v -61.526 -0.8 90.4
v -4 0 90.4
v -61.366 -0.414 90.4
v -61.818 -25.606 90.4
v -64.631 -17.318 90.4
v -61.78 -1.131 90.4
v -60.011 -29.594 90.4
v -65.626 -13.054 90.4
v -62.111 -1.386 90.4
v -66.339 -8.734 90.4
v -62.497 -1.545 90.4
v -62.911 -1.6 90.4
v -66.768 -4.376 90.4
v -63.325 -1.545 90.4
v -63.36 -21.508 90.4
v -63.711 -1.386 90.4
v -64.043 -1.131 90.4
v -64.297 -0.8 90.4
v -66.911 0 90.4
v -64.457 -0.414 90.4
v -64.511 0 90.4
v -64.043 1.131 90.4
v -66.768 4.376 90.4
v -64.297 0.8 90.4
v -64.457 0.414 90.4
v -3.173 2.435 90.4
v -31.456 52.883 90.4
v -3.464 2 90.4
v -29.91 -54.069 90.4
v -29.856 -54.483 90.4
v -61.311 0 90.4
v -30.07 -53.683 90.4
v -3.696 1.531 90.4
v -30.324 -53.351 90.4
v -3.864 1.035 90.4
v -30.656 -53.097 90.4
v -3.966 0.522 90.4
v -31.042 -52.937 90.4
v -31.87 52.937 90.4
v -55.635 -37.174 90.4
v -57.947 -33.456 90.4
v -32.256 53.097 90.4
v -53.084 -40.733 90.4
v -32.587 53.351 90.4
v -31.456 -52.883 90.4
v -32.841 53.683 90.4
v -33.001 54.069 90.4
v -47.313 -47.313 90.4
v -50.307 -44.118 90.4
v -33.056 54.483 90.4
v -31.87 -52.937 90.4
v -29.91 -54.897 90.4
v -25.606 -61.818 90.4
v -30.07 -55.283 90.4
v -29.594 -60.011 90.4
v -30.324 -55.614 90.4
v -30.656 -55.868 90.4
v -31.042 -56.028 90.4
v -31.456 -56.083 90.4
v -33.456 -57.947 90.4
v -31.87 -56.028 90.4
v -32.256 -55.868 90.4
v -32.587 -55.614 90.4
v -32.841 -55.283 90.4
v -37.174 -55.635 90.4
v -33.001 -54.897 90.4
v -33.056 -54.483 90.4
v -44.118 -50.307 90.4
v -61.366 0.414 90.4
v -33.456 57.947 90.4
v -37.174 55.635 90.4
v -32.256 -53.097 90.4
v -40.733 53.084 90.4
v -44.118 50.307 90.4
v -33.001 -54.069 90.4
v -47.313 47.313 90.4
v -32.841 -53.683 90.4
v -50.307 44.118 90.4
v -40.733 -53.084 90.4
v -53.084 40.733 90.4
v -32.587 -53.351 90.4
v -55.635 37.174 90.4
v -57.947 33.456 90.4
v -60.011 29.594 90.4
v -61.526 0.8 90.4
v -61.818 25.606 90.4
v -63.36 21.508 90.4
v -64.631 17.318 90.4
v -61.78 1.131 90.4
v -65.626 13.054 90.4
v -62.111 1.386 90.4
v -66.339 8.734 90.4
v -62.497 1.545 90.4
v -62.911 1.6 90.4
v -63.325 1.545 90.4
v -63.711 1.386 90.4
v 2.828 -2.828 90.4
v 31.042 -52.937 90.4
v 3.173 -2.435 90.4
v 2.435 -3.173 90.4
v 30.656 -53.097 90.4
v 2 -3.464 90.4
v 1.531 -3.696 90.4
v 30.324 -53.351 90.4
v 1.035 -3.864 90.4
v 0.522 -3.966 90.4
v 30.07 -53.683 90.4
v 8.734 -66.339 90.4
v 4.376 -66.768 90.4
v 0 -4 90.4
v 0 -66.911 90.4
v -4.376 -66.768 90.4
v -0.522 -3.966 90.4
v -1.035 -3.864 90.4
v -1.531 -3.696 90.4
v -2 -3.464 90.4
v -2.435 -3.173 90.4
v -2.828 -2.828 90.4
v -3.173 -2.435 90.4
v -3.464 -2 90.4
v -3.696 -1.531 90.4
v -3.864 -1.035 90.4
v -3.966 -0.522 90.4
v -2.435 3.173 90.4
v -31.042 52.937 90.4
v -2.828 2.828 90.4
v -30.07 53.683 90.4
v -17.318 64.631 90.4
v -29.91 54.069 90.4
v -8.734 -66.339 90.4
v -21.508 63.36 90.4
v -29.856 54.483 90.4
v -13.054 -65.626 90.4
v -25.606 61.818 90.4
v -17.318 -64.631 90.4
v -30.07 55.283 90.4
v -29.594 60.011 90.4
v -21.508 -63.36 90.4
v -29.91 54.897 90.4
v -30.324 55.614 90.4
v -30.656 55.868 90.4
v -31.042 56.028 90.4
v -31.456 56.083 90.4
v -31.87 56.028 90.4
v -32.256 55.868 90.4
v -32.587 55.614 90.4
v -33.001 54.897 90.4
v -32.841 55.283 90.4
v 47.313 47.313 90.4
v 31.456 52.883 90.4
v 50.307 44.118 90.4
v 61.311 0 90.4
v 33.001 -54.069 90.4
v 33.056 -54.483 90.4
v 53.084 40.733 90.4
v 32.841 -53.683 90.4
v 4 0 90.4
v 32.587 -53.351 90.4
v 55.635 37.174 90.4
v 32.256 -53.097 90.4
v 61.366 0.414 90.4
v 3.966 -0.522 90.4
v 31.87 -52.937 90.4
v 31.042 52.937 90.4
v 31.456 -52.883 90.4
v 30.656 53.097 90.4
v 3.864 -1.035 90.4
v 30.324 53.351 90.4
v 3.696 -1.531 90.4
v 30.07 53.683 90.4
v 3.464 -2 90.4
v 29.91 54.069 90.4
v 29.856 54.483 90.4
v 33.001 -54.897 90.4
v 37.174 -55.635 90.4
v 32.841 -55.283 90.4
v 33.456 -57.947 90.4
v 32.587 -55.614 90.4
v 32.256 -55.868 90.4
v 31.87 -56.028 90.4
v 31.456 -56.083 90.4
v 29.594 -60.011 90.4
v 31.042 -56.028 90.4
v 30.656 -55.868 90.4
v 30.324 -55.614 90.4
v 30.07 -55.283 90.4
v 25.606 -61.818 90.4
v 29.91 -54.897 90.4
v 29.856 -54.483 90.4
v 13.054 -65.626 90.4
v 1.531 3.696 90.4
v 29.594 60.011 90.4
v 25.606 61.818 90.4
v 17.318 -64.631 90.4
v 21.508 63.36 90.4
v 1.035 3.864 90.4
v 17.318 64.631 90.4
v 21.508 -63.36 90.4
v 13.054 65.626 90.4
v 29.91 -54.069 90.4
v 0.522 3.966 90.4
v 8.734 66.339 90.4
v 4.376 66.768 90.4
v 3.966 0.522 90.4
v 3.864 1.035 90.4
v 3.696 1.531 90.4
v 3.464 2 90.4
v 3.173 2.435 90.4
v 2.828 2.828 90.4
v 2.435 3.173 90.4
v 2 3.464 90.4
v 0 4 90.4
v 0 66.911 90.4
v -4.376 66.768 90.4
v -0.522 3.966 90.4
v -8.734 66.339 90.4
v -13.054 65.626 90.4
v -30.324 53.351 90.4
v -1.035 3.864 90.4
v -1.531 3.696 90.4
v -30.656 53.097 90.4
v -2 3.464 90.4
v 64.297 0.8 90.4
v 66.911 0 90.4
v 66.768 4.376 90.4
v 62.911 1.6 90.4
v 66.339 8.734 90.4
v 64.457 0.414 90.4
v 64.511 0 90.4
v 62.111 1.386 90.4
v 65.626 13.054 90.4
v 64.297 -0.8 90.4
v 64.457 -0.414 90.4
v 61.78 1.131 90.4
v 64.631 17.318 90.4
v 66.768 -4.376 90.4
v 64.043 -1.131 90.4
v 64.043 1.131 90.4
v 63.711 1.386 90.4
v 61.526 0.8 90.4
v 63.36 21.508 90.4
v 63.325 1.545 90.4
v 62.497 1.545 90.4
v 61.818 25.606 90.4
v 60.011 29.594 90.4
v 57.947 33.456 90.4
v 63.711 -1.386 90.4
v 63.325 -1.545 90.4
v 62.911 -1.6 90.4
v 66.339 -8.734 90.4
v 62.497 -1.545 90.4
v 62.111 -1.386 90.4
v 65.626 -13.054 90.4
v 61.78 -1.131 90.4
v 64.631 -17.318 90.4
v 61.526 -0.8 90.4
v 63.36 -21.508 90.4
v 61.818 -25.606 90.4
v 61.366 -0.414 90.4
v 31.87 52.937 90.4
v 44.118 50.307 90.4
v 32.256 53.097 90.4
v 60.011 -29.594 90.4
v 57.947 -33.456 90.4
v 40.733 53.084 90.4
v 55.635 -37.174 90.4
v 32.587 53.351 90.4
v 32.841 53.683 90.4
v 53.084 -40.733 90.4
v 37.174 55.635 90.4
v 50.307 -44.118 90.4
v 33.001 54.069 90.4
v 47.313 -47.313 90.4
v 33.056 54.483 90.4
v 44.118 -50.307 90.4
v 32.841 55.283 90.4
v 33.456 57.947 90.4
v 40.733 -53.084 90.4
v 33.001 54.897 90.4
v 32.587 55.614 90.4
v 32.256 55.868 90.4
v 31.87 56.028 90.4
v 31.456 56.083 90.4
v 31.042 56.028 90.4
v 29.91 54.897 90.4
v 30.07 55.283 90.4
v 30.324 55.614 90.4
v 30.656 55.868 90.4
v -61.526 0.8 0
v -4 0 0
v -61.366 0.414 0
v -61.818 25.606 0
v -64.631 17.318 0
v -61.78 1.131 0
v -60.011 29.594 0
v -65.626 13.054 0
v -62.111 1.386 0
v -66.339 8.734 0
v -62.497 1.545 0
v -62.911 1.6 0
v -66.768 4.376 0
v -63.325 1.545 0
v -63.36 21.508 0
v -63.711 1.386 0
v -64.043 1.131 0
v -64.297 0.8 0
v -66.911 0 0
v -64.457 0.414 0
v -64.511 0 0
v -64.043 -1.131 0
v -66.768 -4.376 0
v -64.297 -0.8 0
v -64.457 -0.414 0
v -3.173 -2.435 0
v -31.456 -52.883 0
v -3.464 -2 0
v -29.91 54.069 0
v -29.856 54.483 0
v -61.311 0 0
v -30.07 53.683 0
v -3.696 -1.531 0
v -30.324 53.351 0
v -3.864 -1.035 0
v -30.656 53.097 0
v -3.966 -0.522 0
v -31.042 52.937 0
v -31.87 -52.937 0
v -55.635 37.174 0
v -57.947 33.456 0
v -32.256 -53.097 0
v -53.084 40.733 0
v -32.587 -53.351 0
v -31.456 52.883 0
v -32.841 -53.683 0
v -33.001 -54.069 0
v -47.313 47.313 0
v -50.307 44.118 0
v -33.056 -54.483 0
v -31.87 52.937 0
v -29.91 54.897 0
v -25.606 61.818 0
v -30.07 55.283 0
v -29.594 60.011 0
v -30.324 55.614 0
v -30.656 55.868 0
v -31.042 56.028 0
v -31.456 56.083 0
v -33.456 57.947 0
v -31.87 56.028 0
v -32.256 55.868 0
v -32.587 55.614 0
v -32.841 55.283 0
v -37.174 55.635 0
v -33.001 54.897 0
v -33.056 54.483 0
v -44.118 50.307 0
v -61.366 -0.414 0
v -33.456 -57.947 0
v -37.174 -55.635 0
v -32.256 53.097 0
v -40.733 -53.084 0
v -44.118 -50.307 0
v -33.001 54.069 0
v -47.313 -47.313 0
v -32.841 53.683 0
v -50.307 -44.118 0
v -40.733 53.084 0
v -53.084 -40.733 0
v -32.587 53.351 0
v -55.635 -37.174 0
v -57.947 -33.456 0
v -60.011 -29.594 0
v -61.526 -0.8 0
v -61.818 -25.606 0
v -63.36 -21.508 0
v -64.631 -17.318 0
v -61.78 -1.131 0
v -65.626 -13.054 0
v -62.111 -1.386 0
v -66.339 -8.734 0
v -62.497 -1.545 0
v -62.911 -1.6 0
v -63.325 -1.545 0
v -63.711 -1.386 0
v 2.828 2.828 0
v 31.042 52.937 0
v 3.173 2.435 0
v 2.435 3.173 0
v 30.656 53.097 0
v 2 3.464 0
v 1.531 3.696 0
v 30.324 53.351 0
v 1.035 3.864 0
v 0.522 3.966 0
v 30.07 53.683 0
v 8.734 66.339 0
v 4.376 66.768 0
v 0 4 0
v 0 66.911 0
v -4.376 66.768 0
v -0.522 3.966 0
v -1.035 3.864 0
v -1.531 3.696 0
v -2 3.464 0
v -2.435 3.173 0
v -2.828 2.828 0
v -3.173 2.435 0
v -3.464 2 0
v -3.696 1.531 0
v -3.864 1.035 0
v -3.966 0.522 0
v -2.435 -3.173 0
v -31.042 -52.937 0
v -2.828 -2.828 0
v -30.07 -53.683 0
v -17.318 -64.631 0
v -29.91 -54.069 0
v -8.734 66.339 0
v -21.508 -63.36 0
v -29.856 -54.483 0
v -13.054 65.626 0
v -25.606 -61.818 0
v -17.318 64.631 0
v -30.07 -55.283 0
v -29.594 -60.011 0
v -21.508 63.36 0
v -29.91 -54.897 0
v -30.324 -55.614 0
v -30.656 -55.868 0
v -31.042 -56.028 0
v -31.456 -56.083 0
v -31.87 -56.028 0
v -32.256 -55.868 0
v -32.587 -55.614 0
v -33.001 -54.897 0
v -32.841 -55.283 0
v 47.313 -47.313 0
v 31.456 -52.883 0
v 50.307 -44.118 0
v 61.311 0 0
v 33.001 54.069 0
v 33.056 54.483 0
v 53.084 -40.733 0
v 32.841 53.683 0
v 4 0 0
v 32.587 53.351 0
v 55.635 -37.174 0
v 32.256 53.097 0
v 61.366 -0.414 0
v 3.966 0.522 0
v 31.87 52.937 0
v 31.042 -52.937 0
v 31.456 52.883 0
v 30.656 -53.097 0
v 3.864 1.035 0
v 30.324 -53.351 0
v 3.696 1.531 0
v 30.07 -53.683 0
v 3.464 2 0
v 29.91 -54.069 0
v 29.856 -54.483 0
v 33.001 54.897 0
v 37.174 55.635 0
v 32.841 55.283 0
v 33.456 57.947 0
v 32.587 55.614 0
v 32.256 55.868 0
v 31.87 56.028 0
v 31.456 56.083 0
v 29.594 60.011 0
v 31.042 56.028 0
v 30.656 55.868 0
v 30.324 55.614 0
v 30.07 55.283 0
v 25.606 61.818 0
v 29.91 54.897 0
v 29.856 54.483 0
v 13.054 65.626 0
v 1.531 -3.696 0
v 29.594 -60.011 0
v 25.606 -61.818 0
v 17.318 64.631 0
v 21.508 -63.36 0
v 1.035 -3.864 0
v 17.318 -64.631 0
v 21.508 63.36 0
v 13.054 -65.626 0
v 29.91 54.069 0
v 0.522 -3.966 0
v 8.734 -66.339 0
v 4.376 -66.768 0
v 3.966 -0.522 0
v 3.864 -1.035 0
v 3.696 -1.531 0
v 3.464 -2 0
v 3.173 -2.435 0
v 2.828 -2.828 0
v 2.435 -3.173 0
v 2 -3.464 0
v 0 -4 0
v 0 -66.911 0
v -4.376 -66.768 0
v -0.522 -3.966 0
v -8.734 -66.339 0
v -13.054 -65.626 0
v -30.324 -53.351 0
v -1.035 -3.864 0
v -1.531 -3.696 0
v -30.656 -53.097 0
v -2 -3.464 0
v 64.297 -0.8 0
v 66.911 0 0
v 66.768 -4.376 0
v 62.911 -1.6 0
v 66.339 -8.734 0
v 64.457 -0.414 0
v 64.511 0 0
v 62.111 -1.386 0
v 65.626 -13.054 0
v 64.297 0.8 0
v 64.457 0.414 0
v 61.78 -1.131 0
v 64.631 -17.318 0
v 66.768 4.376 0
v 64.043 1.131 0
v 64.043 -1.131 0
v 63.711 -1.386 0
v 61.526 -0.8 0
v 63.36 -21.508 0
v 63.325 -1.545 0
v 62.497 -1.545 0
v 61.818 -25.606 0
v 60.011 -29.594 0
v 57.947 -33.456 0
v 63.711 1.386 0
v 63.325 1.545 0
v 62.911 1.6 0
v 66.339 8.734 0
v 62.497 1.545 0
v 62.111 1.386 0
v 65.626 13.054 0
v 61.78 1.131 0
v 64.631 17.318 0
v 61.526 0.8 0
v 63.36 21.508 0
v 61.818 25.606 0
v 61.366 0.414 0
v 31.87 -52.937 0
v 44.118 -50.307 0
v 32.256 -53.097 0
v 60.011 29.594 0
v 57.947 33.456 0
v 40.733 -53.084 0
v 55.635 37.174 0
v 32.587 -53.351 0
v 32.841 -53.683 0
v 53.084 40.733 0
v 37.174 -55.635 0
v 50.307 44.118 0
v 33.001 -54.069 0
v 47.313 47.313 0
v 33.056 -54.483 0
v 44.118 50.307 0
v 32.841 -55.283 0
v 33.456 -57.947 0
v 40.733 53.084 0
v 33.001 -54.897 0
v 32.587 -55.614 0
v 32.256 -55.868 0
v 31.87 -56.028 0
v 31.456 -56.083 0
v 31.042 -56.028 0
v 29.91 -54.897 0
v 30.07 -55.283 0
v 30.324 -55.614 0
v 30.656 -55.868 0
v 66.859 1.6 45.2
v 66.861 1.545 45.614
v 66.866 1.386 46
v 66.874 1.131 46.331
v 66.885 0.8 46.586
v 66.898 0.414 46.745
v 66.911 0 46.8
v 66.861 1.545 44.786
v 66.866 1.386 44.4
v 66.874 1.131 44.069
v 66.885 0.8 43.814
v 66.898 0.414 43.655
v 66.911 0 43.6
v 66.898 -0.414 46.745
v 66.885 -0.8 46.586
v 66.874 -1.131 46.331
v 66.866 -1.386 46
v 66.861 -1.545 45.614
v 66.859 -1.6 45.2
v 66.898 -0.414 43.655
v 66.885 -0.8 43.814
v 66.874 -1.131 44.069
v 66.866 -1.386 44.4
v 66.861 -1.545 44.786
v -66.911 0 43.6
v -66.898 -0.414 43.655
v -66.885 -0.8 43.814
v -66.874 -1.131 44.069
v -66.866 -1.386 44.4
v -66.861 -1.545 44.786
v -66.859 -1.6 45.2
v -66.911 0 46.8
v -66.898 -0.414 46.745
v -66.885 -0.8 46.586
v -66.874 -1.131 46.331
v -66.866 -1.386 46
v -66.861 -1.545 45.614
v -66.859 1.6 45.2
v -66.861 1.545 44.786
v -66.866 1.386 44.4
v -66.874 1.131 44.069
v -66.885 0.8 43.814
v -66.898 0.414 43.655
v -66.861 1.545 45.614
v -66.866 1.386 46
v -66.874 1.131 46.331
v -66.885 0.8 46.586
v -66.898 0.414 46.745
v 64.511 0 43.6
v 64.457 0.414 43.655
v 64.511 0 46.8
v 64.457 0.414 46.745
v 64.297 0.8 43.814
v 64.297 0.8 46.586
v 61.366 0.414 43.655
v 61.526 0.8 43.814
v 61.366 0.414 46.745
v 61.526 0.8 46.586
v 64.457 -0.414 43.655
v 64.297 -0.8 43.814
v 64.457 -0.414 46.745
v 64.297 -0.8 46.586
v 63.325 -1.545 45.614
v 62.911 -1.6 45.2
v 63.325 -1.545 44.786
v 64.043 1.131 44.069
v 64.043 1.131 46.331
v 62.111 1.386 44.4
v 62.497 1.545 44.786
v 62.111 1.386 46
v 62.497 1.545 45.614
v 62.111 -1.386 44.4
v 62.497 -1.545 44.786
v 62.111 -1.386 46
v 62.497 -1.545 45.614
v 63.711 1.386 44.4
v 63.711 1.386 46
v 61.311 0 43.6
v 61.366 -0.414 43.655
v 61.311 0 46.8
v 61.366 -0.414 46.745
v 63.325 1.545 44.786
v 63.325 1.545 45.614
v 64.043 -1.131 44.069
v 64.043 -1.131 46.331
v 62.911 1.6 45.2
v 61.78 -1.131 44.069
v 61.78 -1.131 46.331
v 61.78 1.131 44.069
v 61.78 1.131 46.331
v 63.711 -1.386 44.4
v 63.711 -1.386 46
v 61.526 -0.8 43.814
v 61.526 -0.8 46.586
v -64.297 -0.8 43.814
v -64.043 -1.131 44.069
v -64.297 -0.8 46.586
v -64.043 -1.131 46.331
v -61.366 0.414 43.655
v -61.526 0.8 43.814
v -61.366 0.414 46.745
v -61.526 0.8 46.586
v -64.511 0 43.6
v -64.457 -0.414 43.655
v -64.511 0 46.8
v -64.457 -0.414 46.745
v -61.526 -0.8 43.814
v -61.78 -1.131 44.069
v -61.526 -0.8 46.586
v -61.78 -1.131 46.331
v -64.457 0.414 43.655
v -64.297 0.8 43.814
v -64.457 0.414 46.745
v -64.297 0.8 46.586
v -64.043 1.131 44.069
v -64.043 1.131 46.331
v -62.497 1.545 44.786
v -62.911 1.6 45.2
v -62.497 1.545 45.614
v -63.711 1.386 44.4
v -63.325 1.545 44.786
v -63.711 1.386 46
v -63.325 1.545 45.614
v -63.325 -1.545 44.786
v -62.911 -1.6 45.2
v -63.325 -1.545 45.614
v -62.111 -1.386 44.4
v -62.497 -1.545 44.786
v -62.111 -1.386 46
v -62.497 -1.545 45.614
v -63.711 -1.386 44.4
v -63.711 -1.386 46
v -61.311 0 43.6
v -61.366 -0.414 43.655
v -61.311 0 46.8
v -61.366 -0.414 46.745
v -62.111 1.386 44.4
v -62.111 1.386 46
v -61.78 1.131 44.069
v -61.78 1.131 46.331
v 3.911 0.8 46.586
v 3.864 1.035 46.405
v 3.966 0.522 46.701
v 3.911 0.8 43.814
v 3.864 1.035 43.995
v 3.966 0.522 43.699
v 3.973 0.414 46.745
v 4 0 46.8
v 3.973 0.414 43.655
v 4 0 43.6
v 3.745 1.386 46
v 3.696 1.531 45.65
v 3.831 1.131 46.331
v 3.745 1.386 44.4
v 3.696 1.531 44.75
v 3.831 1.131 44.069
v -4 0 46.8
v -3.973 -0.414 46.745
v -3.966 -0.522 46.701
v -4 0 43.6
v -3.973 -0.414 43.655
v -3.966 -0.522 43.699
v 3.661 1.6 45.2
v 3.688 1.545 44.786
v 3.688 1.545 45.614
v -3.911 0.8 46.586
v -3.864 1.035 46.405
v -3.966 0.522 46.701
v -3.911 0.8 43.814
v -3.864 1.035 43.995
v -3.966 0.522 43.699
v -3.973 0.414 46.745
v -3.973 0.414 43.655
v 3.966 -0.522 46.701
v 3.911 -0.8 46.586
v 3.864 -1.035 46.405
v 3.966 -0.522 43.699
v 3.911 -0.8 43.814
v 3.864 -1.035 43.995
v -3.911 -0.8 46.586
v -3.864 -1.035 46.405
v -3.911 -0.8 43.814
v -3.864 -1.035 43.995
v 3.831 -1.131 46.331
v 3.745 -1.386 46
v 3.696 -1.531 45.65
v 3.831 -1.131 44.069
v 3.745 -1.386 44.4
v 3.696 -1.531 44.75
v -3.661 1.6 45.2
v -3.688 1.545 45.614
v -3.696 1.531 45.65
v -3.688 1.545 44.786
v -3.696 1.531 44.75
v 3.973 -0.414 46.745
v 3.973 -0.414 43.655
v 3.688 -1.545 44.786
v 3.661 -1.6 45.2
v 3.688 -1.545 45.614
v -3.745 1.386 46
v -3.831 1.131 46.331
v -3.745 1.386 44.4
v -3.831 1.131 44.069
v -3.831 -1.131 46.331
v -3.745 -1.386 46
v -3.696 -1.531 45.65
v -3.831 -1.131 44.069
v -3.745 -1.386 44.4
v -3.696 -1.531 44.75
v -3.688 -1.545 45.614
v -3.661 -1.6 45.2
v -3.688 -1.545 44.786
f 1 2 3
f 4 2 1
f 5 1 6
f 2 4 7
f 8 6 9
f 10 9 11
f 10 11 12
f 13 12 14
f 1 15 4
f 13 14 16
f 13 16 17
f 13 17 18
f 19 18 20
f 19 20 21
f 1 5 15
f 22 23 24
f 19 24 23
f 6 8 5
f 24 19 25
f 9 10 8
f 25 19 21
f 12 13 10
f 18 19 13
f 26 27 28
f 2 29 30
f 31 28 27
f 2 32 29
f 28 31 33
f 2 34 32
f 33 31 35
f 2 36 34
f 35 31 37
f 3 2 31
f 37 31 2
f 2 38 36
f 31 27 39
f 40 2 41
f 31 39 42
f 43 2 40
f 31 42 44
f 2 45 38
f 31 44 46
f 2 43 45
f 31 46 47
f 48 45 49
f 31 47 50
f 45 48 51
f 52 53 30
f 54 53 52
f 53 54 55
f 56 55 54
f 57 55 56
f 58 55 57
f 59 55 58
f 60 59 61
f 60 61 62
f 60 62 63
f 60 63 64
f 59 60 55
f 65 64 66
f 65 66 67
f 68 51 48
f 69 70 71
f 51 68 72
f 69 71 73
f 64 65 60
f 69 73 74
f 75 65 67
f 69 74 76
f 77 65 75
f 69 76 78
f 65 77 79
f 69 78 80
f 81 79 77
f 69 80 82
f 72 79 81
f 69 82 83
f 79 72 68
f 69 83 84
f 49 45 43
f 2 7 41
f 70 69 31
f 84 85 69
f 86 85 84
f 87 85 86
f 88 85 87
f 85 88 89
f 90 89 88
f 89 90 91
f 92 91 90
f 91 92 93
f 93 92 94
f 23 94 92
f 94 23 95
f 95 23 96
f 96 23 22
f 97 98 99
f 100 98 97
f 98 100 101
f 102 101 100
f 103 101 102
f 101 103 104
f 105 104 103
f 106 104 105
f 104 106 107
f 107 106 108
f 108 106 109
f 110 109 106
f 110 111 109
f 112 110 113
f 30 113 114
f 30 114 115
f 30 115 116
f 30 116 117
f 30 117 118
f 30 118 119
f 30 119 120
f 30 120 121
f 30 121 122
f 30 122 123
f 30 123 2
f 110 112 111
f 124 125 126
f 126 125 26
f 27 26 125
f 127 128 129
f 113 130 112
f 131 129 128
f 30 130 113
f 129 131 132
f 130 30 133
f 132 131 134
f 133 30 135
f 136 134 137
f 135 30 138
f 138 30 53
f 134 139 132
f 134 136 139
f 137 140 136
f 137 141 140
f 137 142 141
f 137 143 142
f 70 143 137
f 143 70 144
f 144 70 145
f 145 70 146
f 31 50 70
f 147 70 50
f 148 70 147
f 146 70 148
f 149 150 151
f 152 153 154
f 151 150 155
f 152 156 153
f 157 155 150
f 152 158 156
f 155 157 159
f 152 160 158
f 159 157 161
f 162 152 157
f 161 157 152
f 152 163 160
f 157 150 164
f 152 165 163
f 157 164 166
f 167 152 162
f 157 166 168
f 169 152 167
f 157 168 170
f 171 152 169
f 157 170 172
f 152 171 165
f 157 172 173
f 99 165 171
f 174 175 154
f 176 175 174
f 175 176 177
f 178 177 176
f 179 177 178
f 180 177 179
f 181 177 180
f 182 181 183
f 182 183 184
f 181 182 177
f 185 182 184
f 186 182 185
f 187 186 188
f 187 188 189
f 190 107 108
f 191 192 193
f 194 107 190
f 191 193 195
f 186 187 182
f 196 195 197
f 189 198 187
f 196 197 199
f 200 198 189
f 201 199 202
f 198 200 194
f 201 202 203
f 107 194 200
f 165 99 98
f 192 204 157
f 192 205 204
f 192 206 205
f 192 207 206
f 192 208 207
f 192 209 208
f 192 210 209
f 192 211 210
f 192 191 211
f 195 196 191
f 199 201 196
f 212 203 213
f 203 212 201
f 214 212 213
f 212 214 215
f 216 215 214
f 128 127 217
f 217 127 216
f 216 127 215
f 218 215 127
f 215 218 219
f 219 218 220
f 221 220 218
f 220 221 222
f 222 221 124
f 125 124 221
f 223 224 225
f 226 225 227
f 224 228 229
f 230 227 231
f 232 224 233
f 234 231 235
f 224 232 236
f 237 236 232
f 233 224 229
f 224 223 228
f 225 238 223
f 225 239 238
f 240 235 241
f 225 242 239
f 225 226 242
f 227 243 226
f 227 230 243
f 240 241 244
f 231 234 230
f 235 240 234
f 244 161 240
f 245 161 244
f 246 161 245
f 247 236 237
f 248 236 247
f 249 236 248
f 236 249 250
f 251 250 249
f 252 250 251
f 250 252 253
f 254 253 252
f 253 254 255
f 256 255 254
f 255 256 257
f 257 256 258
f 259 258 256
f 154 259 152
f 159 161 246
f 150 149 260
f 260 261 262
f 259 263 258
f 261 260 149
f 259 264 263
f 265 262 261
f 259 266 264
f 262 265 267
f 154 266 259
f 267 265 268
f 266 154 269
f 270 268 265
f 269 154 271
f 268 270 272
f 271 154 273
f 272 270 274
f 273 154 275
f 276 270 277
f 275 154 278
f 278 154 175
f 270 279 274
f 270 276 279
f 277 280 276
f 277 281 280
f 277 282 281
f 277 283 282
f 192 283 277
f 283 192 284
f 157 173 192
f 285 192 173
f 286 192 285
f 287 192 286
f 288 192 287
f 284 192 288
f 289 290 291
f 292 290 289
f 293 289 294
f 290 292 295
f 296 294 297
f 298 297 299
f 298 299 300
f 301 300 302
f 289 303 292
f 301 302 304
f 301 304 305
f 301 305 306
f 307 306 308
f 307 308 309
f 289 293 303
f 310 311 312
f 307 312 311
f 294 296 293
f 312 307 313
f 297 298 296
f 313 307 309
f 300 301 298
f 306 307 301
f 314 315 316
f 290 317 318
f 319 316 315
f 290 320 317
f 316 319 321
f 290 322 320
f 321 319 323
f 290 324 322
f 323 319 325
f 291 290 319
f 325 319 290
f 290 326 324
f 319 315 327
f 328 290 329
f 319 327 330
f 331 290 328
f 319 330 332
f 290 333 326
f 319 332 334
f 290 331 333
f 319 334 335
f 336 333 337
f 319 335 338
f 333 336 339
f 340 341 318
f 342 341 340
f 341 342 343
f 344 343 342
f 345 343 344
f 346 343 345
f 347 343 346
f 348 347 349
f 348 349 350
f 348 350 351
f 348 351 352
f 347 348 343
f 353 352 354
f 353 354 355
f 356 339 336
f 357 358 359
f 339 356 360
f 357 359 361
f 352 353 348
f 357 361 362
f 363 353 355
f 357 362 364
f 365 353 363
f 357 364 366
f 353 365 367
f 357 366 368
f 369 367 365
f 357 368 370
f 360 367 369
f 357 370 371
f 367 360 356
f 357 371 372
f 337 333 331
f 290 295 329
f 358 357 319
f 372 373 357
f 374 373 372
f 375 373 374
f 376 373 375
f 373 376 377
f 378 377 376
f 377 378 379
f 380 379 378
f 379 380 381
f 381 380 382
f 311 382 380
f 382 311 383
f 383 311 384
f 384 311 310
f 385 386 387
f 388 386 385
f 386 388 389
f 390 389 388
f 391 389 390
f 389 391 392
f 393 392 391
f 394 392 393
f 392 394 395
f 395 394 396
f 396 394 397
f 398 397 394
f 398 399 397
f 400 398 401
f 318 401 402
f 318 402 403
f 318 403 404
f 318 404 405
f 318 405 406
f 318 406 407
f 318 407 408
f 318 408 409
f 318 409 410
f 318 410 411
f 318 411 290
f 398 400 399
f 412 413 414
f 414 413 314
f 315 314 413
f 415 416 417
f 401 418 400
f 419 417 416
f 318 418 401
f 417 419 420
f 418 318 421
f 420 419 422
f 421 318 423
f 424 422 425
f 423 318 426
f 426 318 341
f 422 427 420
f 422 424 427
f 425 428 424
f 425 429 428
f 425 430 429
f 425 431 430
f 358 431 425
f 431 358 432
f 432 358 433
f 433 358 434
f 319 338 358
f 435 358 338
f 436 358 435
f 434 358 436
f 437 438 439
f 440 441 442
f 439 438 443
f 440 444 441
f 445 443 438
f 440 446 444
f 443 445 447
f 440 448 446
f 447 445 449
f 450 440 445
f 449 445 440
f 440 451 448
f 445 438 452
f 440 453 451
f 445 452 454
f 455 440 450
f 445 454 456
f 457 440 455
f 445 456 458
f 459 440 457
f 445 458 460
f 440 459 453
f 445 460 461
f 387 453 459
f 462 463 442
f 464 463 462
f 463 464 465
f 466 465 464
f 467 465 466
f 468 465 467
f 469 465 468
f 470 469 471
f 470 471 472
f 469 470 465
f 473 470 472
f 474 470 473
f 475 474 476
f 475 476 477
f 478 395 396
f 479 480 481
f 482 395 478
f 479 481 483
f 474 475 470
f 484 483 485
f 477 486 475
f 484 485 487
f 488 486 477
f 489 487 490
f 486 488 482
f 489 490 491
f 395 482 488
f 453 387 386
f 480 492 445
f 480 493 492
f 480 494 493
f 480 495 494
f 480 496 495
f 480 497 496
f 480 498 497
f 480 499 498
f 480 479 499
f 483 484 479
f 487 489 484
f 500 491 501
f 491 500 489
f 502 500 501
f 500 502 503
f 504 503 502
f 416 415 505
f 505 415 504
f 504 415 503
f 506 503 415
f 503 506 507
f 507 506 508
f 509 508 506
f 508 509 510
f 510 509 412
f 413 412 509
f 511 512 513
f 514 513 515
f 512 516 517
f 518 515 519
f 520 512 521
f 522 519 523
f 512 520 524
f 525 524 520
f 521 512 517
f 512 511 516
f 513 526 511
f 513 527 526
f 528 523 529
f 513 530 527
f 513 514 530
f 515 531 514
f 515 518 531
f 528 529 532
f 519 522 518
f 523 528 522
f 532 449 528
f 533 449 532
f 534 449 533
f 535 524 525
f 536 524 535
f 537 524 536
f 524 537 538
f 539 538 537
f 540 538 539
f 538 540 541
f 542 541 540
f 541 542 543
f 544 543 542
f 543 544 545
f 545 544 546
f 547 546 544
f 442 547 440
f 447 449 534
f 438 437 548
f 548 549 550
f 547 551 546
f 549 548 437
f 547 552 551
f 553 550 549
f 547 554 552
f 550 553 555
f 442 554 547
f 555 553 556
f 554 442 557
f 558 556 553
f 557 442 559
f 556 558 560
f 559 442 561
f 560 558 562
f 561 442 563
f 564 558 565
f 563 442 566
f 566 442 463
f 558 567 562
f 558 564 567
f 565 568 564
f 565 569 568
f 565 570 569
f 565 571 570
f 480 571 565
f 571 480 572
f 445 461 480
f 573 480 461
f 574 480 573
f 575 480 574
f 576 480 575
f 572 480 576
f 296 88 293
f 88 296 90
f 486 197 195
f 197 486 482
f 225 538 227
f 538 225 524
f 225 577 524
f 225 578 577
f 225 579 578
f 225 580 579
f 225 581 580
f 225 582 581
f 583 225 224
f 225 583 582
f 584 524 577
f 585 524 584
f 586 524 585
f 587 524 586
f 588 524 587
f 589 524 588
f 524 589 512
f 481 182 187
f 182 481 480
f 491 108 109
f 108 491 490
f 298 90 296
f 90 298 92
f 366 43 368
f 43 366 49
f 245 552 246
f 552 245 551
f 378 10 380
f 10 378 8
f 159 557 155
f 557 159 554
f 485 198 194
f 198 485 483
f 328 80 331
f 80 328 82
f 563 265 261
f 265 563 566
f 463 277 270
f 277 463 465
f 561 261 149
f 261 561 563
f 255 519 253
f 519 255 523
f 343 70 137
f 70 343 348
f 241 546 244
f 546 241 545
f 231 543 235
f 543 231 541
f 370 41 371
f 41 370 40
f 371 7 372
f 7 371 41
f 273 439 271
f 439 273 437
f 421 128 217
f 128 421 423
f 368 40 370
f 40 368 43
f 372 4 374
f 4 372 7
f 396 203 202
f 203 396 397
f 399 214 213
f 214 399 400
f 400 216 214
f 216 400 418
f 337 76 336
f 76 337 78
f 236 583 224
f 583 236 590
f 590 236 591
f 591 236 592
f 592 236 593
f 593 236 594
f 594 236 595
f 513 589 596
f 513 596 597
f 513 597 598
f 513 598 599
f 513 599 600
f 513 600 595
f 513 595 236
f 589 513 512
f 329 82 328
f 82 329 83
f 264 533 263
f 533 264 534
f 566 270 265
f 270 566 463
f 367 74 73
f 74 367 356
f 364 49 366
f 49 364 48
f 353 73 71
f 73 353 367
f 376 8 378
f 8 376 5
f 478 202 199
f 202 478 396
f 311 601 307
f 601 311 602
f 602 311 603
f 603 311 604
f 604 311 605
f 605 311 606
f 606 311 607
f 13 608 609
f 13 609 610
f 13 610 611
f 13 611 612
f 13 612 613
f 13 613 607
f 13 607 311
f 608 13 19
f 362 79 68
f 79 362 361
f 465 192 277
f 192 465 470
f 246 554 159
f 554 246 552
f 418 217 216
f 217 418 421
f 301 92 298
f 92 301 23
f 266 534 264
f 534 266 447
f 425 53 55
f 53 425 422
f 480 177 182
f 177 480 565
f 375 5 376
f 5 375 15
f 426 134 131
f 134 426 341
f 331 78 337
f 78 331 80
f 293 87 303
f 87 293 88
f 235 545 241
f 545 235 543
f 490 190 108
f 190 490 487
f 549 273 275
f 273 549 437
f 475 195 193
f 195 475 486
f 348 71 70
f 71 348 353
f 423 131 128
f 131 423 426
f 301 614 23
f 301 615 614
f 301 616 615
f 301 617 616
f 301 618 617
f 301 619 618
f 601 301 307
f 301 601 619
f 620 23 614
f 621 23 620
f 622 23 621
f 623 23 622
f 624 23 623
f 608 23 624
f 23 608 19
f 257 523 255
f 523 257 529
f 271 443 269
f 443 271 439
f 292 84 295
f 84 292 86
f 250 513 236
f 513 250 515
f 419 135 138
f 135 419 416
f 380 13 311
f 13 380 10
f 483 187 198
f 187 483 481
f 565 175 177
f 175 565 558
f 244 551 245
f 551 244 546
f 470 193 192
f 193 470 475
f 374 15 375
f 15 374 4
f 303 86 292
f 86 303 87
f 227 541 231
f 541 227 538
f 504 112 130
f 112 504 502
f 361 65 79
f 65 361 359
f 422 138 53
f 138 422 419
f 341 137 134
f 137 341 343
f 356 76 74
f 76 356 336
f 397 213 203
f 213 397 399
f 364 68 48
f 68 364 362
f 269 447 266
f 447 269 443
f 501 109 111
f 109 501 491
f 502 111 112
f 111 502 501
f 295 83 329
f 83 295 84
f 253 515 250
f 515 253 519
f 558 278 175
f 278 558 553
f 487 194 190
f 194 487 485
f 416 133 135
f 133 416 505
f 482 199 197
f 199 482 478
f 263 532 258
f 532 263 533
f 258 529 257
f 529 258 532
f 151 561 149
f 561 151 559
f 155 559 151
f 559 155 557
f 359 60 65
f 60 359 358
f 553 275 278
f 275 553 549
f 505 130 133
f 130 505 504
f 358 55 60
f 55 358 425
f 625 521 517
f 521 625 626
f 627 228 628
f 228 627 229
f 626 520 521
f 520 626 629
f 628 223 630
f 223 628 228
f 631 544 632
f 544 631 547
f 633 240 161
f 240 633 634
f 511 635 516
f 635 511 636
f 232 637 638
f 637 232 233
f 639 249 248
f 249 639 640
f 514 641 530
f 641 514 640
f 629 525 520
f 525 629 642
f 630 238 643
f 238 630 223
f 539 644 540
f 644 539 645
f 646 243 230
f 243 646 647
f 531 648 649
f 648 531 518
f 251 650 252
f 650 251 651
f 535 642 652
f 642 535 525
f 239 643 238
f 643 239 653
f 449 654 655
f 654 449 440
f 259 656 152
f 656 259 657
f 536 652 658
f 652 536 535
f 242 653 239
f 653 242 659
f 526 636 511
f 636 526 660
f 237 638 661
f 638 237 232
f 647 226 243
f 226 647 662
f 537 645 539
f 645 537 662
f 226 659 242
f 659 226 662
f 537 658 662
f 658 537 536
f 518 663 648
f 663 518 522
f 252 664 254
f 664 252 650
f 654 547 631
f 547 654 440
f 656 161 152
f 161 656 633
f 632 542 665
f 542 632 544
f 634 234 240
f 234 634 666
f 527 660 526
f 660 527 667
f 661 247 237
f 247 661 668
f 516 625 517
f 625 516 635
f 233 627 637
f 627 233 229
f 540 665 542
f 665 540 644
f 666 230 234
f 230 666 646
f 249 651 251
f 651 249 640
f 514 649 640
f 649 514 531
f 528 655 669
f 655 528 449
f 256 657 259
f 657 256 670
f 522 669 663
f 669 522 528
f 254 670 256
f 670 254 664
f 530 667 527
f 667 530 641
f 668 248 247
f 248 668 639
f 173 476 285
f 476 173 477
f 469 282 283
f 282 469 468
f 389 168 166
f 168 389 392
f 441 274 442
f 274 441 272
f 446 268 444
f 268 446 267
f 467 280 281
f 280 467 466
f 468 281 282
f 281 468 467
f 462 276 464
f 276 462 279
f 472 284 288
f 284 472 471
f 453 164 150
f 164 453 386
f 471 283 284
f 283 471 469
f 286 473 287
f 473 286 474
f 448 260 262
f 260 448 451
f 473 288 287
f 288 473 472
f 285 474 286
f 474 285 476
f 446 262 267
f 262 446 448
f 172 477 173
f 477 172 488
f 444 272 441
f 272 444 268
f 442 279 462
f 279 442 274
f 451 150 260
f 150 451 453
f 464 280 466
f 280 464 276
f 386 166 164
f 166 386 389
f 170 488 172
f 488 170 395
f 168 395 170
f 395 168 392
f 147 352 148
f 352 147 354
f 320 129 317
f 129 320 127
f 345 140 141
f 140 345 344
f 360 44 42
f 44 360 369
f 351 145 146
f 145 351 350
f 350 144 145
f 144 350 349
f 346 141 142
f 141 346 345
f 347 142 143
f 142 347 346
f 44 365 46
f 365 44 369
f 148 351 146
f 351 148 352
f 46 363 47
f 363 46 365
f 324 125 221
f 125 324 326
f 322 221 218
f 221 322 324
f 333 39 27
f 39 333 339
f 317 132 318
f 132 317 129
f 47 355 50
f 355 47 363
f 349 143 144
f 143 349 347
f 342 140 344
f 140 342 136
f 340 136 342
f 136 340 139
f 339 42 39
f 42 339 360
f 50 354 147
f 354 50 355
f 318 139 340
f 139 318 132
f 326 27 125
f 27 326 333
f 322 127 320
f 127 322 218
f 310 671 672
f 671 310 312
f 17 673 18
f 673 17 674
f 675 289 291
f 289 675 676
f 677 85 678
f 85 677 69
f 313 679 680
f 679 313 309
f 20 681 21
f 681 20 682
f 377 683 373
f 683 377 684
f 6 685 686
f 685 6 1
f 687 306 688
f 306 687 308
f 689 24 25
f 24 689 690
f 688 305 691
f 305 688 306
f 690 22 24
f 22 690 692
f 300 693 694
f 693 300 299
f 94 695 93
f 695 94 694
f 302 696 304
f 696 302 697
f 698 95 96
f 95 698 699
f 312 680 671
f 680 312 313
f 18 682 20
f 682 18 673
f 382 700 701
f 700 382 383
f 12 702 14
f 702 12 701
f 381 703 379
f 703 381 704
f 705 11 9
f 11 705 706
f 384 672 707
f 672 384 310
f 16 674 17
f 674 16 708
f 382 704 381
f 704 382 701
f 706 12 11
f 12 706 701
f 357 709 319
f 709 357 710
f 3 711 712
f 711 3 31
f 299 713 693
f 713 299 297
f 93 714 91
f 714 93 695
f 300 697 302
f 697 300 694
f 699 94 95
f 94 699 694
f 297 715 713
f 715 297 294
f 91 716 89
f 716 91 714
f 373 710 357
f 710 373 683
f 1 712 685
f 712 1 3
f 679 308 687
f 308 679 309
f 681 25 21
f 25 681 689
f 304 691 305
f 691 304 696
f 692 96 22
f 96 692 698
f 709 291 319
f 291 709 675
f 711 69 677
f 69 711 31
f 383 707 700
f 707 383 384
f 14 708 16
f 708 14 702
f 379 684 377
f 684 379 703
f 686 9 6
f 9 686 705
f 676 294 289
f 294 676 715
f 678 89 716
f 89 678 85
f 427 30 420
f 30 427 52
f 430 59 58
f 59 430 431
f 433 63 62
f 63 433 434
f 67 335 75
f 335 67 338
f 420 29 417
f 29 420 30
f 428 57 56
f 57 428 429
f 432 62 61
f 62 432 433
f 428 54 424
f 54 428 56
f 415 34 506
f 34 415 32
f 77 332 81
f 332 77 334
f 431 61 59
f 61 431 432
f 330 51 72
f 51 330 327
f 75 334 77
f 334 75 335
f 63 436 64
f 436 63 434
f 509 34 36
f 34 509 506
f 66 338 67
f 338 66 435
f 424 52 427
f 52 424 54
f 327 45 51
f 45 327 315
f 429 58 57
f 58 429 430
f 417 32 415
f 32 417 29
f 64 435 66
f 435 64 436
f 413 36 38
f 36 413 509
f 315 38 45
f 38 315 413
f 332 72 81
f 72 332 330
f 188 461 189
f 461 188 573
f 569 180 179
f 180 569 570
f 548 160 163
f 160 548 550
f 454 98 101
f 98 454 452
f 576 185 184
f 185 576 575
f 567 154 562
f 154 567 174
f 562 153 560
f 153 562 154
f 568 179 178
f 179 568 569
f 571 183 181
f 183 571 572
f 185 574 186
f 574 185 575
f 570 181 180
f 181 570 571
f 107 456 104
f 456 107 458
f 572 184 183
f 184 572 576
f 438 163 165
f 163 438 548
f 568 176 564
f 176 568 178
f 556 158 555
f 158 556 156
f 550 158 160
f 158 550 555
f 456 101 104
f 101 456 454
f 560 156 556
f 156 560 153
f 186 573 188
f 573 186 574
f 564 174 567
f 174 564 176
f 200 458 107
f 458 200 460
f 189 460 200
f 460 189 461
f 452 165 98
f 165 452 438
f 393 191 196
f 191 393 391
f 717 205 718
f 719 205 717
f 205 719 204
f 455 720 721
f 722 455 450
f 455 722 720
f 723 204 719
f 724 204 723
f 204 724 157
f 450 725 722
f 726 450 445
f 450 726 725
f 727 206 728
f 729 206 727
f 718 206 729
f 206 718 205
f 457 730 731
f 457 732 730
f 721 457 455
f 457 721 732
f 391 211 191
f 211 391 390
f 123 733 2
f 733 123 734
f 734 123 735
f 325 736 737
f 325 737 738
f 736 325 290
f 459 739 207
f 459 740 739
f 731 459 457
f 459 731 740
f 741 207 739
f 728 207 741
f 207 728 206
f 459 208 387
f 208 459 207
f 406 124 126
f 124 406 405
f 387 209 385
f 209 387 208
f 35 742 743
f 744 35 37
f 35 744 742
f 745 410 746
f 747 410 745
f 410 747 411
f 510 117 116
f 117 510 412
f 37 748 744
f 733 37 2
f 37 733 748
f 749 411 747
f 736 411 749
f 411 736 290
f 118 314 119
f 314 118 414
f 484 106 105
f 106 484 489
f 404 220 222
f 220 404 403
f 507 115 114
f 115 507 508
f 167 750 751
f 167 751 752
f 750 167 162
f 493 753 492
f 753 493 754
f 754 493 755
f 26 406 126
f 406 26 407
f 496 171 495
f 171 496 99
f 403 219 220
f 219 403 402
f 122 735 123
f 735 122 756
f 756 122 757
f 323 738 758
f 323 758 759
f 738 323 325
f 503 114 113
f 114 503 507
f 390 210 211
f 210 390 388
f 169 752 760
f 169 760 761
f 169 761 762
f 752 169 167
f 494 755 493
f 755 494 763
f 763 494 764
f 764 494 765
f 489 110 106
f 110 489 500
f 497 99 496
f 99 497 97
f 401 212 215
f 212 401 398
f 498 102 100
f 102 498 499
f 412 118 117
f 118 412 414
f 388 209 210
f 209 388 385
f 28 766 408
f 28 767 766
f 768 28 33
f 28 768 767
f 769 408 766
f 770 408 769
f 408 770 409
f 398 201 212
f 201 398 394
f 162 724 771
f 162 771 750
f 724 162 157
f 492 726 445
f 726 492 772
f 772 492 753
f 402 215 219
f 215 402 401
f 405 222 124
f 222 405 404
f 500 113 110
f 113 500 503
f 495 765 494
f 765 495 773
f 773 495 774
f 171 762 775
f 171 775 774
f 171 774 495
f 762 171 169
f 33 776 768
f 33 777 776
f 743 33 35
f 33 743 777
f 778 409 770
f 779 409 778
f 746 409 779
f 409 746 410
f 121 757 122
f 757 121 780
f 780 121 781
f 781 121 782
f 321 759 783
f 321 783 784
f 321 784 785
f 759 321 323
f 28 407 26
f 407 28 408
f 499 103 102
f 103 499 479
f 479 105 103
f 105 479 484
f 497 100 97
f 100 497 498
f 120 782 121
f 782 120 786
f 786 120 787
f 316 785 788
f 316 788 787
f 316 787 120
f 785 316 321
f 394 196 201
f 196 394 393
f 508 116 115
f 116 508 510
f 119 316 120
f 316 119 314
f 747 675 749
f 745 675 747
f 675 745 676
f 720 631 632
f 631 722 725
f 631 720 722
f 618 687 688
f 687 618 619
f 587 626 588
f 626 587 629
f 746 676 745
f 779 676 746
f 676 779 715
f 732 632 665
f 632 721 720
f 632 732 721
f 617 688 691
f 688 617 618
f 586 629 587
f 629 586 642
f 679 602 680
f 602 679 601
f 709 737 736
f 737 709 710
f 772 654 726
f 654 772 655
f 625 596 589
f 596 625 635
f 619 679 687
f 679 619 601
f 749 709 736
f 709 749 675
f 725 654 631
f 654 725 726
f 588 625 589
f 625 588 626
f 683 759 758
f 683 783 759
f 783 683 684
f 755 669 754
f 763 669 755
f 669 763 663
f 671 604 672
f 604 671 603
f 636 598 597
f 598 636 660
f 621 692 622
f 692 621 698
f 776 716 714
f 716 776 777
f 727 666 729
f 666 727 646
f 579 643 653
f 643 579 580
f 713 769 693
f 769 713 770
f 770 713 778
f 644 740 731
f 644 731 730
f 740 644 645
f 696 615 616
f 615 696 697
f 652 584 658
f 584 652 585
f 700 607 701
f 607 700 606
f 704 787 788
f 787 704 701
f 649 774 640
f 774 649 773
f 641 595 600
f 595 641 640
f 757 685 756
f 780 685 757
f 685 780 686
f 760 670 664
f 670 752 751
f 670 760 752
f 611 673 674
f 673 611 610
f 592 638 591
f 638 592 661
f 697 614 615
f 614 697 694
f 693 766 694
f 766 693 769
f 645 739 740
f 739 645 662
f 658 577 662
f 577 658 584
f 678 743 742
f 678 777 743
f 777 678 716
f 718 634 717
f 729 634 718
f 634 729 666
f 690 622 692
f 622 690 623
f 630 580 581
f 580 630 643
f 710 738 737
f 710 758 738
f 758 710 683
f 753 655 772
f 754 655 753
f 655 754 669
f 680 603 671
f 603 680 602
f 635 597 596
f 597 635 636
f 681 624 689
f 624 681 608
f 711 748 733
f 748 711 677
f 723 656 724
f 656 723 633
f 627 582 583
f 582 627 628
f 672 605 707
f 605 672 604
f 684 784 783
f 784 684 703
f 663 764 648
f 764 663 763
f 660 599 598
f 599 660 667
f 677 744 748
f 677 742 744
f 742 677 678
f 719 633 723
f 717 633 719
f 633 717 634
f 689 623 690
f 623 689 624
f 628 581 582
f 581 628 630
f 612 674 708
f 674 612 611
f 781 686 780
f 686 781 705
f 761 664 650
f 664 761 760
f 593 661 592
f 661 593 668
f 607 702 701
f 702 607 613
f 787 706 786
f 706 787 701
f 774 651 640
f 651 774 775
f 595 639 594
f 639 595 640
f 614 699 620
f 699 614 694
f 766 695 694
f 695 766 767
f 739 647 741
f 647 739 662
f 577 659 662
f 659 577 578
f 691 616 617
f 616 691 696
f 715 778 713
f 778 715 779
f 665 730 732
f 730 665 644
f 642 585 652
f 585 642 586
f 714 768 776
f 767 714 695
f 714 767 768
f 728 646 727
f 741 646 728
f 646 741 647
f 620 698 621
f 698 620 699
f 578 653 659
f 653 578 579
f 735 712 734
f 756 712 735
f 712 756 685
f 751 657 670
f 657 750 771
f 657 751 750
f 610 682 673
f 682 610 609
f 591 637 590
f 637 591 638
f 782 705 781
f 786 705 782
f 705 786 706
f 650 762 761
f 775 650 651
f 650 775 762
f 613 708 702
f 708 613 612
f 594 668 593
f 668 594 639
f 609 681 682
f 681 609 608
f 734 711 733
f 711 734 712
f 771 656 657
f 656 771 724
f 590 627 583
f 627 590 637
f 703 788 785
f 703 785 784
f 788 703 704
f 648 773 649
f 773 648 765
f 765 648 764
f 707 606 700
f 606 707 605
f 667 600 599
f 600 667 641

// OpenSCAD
// file: params.scad
// Shared parameters for the whole dispenser — edit these once, every part
// (hub, wedges, base, lid) picks them up via `include`.
// Measure your own packs before printing: hard packs vary a few mm by brand.

slots      = 6;     // number of pockets around the carousel
pack_w     = 55;    // pack width (mm)  - sits tangentially (packs stand upright)
pack_d     = 22;    // pack depth (mm)  - sits radially
pack_h     = 85;    // pack height (mm) - packs stand upright in the pocket
clear      = 3;     // per-side clearance around a pack
wall       = 2.4;   // wall thickness (~6 perimeters at 0.4mm nozzle, PETG)

gap_deg    = 2;                     // angular gap left between neighboring wedges
ang        = 360/slots - gap_deg;   // usable angle per wedge

hub_margin = 6;      // extra radius beyond the strict minimum (wall + boss room)

// r_in is derived, not hand-picked: the tangential width available at r_in
// for one wedge (a chord of angle `ang`) must be >= pack_w + 2*clear, or the
// pack won't fit — sizing this by hand for hub.scad, wedge.scad and base.scad
// separately caused pockets narrower than the pack in an earlier revision.
r_in       = (pack_w + 2*clear) / (2*sin(ang/2)) + hub_margin;
r_out      = r_in + pack_d + clear;

hub_od     = 2 * (r_in - 2);  // hub sits just inside r_in
hub_id     = 8;               // bore for the motor shaft coupler (mm)
hub_height = pack_h + clear + wall;

boss_d     = 6;      // hub attachment boss diameter
boss_hole  = 3.2;    // clearance hole for M3 screw
// main file
// Rotary hub — print 1x, PETG or ABS recommended (PLA wears fast at the bore).
// Carries the motor shaft coupler and gives each wedge (wedge.scad) a screw
// boss to bolt onto.
include <params.scad>

module hub() {
    difference() {
        union() {
            cylinder(d = hub_od, h = hub_height, $fn = 96);
            for (i = [0 : slots - 1])
                rotate([0, 0, i * 360 / slots])
                    translate([hub_od/2 - boss_d/2 - 1, 0, 0])
                        cylinder(d = boss_d, h = hub_height, $fn = 24);
        }
        // motor shaft coupler bore
        translate([0, 0, -1])
            cylinder(d = hub_id, h = hub_height + 2, $fn = 48);
        // grub-screw access hole for the shaft coupler
        translate([-hub_od/2 - 1, 0, hub_height/2])
            rotate([0, 90, 0])
                cylinder(d = 3.2, h = hub_od + 2, $fn = 24);
        // screw holes into the attachment bosses
        for (i = [0 : slots - 1])
            rotate([0, 0, i * 360 / slots])
                translate([hub_od/2 - boss_d/2 - 1, 0, -1])
                    cylinder(d = boss_hole, h = hub_height + 2, $fn = 24);
    }
}

hub();
